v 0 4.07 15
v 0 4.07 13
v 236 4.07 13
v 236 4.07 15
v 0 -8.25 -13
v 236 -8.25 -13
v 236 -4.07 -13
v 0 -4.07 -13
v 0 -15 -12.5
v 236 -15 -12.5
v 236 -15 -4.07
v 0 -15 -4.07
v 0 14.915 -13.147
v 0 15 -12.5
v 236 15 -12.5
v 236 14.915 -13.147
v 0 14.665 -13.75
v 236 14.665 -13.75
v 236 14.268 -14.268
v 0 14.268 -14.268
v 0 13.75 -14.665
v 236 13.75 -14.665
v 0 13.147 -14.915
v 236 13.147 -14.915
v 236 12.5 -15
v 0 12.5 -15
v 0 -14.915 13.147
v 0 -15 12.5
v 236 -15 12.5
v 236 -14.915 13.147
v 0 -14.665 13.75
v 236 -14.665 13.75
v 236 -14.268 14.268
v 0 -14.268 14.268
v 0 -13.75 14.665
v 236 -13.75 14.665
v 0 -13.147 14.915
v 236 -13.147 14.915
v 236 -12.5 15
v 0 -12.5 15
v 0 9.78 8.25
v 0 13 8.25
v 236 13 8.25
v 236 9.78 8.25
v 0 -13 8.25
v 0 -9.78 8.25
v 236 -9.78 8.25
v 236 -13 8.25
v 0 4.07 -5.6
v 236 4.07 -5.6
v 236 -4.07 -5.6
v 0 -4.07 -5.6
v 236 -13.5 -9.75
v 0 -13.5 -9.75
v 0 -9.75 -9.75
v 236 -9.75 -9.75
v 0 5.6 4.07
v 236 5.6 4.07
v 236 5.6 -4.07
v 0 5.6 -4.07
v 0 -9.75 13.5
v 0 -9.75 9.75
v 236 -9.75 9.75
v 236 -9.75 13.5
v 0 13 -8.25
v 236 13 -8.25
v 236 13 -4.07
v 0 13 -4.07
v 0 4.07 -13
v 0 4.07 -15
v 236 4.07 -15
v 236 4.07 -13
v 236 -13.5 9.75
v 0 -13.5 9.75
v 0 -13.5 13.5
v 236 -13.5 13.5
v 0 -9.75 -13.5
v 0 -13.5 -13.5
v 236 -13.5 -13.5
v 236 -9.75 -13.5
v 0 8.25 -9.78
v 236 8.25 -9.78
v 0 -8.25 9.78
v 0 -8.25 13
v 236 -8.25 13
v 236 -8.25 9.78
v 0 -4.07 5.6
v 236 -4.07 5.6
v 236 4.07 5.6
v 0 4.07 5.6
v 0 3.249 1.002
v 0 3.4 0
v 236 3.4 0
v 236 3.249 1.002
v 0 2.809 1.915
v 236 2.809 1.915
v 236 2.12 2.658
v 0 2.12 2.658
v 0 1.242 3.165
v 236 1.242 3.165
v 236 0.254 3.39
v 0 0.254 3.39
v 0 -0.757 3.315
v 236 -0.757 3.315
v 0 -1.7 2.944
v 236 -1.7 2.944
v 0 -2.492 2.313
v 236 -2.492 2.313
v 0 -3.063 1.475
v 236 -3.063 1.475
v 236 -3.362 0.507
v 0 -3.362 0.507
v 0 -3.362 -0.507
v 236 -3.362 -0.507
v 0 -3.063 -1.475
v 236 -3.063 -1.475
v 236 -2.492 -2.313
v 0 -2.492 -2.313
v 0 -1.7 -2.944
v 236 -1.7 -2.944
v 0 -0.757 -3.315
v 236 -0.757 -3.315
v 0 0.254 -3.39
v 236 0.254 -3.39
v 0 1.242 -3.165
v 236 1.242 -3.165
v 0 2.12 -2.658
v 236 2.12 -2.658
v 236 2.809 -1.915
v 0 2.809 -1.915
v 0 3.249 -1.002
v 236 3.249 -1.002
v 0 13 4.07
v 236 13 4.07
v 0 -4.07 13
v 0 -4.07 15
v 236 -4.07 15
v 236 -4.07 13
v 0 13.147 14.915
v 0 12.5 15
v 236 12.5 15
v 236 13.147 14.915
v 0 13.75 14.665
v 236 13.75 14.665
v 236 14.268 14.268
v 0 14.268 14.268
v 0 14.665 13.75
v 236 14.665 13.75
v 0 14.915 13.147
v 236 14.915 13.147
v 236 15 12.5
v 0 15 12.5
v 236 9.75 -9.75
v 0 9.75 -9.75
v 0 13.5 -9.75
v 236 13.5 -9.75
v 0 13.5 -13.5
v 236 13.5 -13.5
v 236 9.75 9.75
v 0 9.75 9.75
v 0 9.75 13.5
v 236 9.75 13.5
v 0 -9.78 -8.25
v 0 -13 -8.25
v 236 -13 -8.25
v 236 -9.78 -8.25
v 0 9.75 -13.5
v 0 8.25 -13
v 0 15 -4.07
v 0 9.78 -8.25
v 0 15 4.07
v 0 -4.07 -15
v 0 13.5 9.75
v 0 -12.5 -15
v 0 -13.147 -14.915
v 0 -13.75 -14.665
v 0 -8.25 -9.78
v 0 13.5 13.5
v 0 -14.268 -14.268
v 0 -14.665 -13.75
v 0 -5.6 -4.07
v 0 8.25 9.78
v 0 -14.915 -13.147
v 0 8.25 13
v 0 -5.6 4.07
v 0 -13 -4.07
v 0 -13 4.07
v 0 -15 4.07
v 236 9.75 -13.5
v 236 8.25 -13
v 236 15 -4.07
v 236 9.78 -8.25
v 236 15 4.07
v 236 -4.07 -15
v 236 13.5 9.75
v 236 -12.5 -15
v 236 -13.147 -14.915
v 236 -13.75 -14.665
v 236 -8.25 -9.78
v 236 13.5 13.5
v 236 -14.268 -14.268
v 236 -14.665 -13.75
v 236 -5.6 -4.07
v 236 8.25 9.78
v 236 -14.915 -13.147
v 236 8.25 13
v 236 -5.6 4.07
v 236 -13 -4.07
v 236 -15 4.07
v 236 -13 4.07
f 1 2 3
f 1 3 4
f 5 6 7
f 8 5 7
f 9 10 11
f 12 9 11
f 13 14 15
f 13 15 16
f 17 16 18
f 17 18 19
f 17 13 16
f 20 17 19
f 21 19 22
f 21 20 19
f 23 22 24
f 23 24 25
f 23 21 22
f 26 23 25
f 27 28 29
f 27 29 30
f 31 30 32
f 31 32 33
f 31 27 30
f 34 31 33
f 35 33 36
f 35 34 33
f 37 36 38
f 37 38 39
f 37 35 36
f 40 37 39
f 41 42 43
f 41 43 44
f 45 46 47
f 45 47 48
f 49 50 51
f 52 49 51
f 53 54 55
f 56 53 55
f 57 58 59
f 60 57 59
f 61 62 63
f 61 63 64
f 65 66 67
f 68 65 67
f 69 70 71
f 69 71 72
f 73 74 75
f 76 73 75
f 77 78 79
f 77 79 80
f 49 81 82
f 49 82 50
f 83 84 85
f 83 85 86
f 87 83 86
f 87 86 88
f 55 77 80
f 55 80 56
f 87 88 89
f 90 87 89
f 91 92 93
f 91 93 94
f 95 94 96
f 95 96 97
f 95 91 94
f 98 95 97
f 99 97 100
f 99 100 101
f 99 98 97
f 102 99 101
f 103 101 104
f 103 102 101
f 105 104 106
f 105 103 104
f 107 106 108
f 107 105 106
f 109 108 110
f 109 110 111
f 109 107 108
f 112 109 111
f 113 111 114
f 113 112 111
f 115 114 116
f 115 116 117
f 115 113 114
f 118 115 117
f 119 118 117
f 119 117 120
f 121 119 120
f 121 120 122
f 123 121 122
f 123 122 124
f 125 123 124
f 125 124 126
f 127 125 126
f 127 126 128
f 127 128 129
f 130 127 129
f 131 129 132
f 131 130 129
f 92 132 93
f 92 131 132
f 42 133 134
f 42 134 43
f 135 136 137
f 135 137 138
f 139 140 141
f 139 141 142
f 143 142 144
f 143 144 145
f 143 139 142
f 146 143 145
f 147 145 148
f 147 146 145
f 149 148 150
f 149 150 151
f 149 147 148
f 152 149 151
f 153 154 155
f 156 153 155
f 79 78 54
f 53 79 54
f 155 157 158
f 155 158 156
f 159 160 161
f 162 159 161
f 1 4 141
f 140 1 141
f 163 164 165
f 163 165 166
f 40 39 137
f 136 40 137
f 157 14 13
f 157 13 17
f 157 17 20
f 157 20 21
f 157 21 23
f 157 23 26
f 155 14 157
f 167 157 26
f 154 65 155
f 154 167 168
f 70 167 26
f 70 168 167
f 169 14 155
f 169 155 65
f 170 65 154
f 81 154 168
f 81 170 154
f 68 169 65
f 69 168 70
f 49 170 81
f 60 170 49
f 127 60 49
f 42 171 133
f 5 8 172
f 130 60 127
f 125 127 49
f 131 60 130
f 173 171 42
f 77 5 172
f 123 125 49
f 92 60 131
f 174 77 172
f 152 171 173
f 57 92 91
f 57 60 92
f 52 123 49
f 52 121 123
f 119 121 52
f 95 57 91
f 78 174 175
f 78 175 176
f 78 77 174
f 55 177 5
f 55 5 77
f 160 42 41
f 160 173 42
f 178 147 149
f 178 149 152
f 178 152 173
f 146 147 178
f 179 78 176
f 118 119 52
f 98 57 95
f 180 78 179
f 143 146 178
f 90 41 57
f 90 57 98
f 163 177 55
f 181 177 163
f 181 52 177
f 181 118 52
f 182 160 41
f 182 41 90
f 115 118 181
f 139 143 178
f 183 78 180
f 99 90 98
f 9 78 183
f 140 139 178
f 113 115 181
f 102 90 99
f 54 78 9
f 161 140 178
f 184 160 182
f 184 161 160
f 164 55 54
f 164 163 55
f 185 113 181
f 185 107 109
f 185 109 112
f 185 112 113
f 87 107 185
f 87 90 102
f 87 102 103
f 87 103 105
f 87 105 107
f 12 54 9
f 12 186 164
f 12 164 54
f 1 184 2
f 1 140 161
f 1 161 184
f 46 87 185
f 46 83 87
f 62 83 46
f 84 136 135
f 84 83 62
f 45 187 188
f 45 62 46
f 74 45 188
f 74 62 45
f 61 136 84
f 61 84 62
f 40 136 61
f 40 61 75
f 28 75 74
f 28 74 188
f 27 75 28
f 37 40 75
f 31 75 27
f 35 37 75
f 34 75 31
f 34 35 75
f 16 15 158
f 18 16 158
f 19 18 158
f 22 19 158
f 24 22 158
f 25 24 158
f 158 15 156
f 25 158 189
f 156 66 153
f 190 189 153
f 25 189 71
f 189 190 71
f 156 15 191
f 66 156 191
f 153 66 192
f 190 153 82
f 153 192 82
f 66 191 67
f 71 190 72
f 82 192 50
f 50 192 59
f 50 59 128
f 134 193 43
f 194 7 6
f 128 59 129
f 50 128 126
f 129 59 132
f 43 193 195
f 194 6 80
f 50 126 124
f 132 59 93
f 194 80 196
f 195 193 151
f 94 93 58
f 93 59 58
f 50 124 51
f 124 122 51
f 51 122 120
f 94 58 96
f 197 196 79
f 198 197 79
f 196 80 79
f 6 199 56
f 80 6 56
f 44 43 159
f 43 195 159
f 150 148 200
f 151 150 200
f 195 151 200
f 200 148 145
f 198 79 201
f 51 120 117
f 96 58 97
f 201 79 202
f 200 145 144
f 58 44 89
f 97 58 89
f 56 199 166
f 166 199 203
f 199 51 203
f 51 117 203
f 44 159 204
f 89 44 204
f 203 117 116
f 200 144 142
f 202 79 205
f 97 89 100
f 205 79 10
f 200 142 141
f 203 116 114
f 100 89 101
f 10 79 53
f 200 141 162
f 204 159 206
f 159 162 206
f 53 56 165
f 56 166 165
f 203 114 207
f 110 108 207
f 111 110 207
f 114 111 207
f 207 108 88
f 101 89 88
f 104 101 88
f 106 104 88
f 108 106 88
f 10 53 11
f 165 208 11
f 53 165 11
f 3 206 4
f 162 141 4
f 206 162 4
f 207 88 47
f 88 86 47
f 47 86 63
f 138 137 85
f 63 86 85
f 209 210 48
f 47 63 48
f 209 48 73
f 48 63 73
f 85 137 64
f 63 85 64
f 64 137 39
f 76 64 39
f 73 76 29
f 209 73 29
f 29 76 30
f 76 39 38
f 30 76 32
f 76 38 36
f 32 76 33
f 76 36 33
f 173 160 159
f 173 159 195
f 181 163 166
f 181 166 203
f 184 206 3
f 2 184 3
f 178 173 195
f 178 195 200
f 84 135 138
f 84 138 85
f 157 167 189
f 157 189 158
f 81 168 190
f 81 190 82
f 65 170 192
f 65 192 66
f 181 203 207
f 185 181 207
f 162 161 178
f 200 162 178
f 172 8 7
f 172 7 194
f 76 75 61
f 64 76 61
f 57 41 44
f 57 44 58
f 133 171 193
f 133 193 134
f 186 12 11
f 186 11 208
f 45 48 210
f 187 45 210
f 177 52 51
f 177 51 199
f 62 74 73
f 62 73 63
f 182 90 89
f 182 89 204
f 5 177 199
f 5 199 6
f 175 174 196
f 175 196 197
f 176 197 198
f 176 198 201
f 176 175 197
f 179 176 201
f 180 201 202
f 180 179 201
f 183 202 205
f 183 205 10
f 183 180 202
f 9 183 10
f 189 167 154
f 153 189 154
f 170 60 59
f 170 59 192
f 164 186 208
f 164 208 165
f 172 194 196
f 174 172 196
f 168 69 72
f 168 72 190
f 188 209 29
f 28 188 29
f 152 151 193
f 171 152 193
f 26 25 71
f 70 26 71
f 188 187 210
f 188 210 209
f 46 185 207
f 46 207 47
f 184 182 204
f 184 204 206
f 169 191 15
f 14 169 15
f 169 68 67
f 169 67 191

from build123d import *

# Parameters (mm, degrees)
SKETCH11_R                     = 3.4
SKETCH11_W                     = 3.75
SKETCH11_H                     = 3.75
T_SLOT_PROFILES_3030_2_1_DEPTH = 236


with BuildPart() as part:
    # Sketch11 → T-slot profiles 3030_2(1) (new body)
    with BuildSketch(Plane.YZ):
        with BuildLine():
            Line((-4.07, 5.6), (4.07, 5.6))
            Line((4.07, 5.6), (8.25, 9.78))
            Line((8.25, 9.78), (8.25, 13))
            Line((8.25, 13), (4.07, 13))
            Line((4.07, 13), (4.07, 15))
            Line((4.07, 15), (12.5, 15))
            ThreePointArc((12.5, 15), (14.267766953, 14.267766953), (15, 12.5))
            Line((15, 12.5), (15, 4.07))
            Line((15, 4.07), (13, 4.07))
            Line((13, 4.07), (13, 8.25))
            Line((13, 8.25), (9.78, 8.25))
            Line((9.78, 8.25), (5.6, 4.07))
            Line((5.6, 4.07), (5.6, -4.07))
            Line((5.6, -4.07), (9.78, -8.25))
            Line((9.78, -8.25), (13, -8.25))
            Line((13, -8.25), (13, -4.07))
            Line((13, -4.07), (15, -4.07))
            Line((15, -4.07), (15, -12.5))
            ThreePointArc((15, -12.5), (14.267766953, -14.267766953), (12.5, -15))
            Line((12.5, -15), (4.07, -15))
            Line((4.07, -15), (4.07, -13))
            Line((4.07, -13), (8.25, -13))
            Line((8.25, -13), (8.25, -9.78))
            Line((8.25, -9.78), (4.07, -5.6))
            Line((4.07, -5.6), (-4.07, -5.6))
            Line((-4.07, -5.6), (-8.25, -9.78))
            Line((-8.25, -9.78), (-8.25, -13))
            Line((-8.25, -13), (-4.07, -13))
            Line((-4.07, -13), (-4.07, -15))
            Line((-4.07, -15), (-12.5, -15))
            ThreePointArc((-12.5, -15), (-14.267766953, -14.267766953), (-15, -12.5))
            Line((-15, -12.5), (-15, -4.07))
            Line((-15, -4.07), (-13, -4.07))
            Line((-13, -4.07), (-13, -8.25))
            Line((-13, -8.25), (-9.78, -8.25))
            Line((-9.78, -8.25), (-5.6, -4.07))
            Line((-5.6, -4.07), (-5.6, 4.07))
            Line((-5.6, 4.07), (-9.78, 8.25))
            Line((-9.78, 8.25), (-13, 8.25))
            Line((-13, 8.25), (-13, 4.07))
            Line((-13, 4.07), (-15, 4.07))
            Line((-15, 4.07), (-15, 12.5))
            ThreePointArc((-15, 12.5), (-14.267766953, 14.267766953), (-12.5, 15))
            Line((-12.5, 15), (-4.07, 15))
            Line((-4.07, 15), (-4.07, 13))
            Line((-4.07, 13), (-8.25, 13))
            Line((-8.25, 13), (-8.25, 9.78))
            Line((-8.25, 9.78), (-4.07, 5.6))
        make_face()
        Circle(SKETCH11_R, mode=Mode.SUBTRACT)
        with Locations((11.625, 11.625)):
            Rectangle(SKETCH11_W, SKETCH11_H, mode=Mode.SUBTRACT)
        with Locations((11.625, -11.625)):
            Rectangle(SKETCH11_W, SKETCH11_H, mode=Mode.SUBTRACT)
        with Locations((-11.625, 11.625)):
            Rectangle(SKETCH11_W, SKETCH11_H, mode=Mode.SUBTRACT)
        with Locations((-11.625, -11.625)):
            Rectangle(SKETCH11_W, SKETCH11_H, mode=Mode.SUBTRACT)
    extrude(amount=T_SLOT_PROFILES_3030_2_1_DEPTH)


solid = part.part
